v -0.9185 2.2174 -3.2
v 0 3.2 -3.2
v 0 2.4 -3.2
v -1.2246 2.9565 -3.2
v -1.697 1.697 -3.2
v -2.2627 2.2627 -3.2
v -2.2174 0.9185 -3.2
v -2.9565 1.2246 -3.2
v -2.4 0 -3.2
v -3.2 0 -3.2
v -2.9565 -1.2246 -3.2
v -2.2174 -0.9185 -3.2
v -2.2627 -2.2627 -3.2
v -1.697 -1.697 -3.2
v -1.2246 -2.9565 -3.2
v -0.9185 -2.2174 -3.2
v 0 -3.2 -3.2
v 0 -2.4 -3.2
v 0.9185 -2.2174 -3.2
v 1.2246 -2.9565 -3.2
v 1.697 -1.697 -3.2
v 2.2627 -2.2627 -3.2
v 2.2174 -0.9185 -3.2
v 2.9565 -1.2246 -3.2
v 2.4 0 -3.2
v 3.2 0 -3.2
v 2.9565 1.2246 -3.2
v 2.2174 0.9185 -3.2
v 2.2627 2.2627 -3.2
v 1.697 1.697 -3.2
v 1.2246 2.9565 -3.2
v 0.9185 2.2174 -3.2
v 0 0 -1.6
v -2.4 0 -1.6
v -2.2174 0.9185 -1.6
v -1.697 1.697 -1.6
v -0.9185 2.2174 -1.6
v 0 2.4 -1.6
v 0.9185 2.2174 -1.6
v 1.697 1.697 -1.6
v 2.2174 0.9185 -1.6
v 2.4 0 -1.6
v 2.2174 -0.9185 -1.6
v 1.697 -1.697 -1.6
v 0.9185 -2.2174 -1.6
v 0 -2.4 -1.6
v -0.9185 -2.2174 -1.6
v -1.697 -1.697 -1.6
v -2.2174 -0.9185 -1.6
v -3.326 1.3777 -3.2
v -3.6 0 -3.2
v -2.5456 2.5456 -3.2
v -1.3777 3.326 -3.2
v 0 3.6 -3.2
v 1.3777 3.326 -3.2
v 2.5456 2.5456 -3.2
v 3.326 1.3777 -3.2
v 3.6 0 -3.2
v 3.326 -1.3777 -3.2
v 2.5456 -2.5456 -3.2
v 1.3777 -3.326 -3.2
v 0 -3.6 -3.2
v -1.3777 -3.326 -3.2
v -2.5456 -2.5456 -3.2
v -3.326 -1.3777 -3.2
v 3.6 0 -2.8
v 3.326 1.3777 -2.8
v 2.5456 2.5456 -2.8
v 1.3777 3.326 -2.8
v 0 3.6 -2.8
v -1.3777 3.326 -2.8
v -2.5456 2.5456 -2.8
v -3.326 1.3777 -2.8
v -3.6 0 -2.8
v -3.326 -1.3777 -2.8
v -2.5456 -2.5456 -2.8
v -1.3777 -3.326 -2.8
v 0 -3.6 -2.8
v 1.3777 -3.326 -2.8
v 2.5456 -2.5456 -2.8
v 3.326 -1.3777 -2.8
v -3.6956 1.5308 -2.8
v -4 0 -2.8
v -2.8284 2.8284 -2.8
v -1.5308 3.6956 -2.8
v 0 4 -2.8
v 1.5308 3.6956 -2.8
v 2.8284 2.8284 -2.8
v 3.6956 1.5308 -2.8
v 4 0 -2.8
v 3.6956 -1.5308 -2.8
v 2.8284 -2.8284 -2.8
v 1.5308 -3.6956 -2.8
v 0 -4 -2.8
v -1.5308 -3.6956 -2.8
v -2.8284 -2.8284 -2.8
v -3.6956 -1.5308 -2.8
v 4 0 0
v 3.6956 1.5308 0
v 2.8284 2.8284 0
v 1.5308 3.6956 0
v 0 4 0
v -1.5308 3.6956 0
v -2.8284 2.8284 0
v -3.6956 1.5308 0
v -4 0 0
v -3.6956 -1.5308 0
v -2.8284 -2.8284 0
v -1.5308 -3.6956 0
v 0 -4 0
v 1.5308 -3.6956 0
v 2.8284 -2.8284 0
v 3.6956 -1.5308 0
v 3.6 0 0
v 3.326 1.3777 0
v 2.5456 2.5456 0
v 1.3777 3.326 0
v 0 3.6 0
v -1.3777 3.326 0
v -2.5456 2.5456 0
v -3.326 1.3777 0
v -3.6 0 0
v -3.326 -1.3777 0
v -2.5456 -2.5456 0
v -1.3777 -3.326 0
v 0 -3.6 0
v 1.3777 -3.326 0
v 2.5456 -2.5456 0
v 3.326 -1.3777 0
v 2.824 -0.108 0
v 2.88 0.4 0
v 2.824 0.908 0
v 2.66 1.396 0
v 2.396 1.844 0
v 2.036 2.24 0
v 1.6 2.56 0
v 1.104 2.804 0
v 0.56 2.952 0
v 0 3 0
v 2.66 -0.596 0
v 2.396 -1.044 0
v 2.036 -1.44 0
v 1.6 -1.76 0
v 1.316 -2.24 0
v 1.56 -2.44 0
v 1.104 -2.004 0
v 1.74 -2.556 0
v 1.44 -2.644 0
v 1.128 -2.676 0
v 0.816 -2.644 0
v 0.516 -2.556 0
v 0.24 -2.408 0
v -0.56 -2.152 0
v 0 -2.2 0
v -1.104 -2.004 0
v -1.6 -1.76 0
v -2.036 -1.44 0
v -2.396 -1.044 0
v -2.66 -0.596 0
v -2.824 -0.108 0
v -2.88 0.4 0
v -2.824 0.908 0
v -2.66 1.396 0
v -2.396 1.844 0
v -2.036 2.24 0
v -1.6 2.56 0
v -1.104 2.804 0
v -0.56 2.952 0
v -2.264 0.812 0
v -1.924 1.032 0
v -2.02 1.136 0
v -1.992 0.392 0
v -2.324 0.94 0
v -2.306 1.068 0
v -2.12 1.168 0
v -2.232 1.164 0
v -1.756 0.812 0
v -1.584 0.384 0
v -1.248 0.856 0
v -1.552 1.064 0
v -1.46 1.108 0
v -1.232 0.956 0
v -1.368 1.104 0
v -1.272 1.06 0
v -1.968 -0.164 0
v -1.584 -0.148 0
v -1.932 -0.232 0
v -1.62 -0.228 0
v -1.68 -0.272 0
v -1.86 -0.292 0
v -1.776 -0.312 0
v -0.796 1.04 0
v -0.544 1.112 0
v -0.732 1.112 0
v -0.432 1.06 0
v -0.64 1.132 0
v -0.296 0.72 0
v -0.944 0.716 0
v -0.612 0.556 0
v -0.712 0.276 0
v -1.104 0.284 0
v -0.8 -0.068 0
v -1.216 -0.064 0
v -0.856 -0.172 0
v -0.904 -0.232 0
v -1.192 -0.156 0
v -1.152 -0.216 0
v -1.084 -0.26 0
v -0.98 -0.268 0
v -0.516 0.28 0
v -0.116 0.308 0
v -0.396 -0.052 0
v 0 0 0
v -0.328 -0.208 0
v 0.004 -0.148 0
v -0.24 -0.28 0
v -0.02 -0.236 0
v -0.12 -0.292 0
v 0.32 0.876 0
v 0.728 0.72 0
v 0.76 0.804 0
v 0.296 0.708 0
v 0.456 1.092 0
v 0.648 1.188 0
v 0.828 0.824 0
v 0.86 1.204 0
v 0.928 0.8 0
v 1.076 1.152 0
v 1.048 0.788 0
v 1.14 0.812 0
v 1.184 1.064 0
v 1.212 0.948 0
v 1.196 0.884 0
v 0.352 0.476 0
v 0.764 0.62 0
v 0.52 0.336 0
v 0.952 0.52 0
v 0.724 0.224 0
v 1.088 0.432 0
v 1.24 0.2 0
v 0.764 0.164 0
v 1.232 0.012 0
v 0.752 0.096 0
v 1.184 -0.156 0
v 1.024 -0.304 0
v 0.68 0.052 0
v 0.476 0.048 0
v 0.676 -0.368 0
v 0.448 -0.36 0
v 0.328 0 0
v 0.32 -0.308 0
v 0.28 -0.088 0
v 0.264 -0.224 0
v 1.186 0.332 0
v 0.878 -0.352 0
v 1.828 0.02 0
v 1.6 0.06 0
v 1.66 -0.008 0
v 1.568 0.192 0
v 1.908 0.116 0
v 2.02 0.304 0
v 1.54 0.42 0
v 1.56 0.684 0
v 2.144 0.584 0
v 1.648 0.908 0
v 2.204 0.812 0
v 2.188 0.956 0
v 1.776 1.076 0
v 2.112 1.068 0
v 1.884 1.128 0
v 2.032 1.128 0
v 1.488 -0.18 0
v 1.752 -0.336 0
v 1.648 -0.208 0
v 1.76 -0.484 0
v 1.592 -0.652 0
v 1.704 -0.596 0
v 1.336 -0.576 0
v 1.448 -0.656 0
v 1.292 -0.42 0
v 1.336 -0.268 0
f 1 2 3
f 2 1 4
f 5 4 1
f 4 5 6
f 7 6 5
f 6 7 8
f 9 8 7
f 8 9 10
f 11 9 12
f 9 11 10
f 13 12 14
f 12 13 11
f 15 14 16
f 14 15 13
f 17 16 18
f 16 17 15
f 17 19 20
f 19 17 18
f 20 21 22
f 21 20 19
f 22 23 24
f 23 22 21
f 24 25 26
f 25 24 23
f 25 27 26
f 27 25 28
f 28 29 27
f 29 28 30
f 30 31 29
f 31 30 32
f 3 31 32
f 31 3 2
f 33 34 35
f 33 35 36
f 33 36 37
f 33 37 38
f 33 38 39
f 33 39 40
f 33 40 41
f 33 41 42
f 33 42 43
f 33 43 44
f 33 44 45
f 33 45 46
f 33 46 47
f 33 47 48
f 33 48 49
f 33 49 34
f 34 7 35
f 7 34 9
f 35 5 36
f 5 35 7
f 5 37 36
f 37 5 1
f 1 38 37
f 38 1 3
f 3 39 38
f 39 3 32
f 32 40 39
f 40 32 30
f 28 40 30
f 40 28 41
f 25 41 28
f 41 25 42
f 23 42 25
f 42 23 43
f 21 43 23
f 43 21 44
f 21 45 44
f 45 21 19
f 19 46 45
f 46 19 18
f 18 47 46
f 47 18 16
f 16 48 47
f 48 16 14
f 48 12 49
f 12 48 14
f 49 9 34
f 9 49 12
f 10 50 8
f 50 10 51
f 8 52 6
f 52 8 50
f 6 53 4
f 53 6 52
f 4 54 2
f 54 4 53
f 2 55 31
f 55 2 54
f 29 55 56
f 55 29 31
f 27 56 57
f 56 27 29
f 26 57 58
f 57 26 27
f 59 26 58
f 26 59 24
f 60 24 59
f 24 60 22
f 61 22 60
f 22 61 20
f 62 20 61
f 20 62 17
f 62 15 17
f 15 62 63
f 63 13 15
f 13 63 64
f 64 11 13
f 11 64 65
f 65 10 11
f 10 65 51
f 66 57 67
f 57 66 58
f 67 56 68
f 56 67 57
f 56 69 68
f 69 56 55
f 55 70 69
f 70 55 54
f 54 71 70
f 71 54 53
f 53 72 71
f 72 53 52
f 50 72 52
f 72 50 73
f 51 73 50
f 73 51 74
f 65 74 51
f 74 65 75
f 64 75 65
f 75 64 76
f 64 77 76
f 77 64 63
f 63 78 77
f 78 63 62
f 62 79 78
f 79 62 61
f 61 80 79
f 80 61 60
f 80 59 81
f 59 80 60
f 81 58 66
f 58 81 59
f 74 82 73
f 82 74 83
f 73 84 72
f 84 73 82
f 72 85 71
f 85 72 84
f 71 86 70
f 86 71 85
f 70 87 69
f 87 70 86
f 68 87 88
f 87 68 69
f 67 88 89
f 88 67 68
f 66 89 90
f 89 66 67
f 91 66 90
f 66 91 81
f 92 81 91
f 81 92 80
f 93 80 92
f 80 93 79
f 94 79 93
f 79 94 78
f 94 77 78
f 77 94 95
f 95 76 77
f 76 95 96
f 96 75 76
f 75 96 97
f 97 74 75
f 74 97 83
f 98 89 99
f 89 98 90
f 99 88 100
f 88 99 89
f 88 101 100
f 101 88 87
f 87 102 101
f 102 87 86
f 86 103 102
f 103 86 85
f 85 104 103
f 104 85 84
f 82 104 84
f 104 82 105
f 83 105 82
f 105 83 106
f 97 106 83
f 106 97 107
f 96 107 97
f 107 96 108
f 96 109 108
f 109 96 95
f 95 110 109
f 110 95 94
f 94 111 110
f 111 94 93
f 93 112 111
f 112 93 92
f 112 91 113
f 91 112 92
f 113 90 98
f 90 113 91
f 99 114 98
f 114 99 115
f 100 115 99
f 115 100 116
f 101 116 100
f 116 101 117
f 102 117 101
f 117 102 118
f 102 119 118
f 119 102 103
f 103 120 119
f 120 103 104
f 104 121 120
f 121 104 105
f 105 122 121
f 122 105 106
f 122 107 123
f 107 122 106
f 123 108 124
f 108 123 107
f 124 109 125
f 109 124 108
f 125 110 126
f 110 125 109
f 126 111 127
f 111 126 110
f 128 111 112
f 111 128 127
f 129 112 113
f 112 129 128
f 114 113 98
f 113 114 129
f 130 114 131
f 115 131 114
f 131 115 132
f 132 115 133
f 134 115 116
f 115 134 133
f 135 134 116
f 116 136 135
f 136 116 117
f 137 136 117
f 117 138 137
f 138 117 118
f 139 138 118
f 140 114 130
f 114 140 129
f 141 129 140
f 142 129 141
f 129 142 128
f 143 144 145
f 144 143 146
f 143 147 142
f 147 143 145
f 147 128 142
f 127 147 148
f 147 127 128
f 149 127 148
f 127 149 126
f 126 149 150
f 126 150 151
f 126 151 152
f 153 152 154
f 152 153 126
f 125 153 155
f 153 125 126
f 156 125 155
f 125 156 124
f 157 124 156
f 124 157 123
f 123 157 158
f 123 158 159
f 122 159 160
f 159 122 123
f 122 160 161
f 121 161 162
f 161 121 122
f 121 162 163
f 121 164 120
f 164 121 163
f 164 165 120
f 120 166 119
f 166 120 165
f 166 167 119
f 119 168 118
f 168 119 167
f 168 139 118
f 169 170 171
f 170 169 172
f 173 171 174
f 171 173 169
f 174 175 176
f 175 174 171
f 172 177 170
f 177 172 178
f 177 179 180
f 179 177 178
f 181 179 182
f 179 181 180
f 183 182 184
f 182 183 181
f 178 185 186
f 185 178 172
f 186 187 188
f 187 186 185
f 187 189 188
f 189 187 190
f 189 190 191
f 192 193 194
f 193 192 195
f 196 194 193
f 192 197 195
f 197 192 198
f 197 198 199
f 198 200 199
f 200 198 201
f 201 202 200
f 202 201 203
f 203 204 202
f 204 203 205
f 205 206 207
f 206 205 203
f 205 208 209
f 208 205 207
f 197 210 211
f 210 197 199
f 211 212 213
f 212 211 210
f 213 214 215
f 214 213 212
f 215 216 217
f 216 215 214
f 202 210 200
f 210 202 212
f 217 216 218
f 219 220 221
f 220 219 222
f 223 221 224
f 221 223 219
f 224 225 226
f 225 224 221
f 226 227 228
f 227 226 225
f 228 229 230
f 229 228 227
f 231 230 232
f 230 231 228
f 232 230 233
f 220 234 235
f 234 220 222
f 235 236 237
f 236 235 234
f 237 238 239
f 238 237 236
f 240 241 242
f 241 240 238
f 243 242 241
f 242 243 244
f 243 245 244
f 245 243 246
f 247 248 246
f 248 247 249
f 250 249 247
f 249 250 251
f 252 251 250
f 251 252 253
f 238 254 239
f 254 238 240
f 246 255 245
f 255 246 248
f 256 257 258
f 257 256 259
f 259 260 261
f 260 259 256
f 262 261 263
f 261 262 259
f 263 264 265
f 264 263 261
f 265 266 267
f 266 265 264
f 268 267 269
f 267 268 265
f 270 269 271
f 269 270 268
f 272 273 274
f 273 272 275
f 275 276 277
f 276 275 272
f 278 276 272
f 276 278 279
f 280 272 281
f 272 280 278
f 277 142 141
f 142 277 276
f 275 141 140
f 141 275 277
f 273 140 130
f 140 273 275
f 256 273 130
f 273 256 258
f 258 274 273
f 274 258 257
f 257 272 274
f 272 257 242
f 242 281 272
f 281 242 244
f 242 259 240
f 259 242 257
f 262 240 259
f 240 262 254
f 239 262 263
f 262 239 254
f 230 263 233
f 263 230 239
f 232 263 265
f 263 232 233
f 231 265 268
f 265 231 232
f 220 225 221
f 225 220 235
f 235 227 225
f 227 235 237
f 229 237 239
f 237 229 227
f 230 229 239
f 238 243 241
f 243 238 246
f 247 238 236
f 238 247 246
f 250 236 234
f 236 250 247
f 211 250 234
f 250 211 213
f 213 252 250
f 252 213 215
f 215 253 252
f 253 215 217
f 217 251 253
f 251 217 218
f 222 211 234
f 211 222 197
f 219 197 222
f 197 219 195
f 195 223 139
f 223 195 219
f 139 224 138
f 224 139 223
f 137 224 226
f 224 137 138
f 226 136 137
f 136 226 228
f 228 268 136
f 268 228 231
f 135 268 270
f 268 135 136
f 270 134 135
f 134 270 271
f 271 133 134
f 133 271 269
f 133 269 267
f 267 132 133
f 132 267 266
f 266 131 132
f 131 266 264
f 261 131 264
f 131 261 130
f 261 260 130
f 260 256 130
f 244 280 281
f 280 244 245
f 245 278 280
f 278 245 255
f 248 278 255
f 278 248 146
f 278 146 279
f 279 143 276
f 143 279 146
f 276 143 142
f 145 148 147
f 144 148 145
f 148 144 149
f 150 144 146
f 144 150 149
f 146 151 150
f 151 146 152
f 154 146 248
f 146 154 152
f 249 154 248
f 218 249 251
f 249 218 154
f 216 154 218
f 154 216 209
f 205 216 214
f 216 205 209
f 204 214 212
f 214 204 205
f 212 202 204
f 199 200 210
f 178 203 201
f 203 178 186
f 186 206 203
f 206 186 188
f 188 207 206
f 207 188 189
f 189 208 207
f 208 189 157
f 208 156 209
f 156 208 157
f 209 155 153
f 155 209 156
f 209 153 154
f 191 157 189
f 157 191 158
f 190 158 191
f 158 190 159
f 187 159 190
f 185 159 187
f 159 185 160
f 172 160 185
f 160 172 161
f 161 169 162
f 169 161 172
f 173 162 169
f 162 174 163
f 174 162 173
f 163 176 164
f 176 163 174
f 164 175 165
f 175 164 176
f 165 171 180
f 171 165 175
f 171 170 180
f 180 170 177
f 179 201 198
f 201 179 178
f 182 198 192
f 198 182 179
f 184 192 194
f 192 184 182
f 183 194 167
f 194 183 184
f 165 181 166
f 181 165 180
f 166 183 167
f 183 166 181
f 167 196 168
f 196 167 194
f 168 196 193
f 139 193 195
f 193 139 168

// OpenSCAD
use <../lib.scad>
use <s/98138p1is01.scad>
use <s/98138s01.scad>
$fa=1; $fs=0.2;
function ldraw_lib__98138p1j(realsolid=false) = [
// 0 Tile  1 x  1 Round with Bright Light Orange "YAS!" in Speech Bubble on Dark Turquoise Background Pattern
// 0 Name: 98138p1j.dat
// 0 Author: Gerald Lasser [GeraldLasser]
// 0 !LDRAW_ORG Part UPDATE 2022-04
// 0 !LICENSE Licensed under CC BY 2.0 and CC BY 4.0 : see CAreadme.txt
// 
// 0 BFC CERTIFY CCW
  [0,"BFC","CERTIFY"],
  [0,"BFC","CCW"],
// 
// 0 !KEYWORDS Dots, Set Creativity Box 8
// 
// 0 !HISTORY 2022-07-18 [PTadmin] Official Update 2022-04
// 
// 
// 1 16 0 0 0 1 0 0 0 1 0 0 0 1 s\98138s01.dat
  [1,16,0,0,0,1,0,0,0,1,0,0,0,1, ldraw_lib__s__98138s01(realsolid)],
// 1 3 0 0 0 -1 0 0 0 1 0 0 0 1 s\98138p1is01.dat
  [1,3,0,0,0,-1,0,0,0,1,0,0,0,1, ldraw_lib__s__98138p1is01(realsolid)],
// 
// 4 191 -5.66 0 2.03 -4.98 0 .98 -4.81 0 2.58 -5.05 0 2.84
  [4,191,-5.66,0,2.03,-4.98,0,.98,-4.81,0,2.58,-5.05,0,2.84],
// 4 191 -5.81 0 2.35 -5.66 0 2.03 -5.05 0 2.84 -5.765 0 2.67
  [4,191,-5.81,0,2.35,-5.66,0,2.03,-5.05,0,2.84,-5.765,0,2.67],
// 4 191 -5.05 0 2.84 -5.3 0 2.92 -5.58 0 2.91 -5.765 0 2.67
  [4,191,-5.05,0,2.84,-5.3,0,2.92,-5.58,0,2.91,-5.765,0,2.67],
// 4 191 -4.39 0 2.03 -4.81 0 2.58 -4.98 0 .98 -3.96 0 .96
  [4,191,-4.39,0,2.03,-4.81,0,2.58,-4.98,0,.98,-3.96,0,.96],
// 4 191 -3.88 0 2.66 -4.39 0 2.03 -3.96 0 .96 -3.12 0 2.14
  [4,191,-3.88,0,2.66,-4.39,0,2.03,-3.96,0,.96,-3.12,0,2.14],
// 4 191 -3.88 0 2.66 -3.12 0 2.14 -3.08 0 2.39 -3.65 0 2.77
  [4,191,-3.88,0,2.66,-3.12,0,2.14,-3.08,0,2.39,-3.65,0,2.77],
// 4 191 -3.42 0 2.76 -3.65 0 2.77 -3.08 0 2.39 -3.18 0 2.65
  [4,191,-3.42,0,2.76,-3.65,0,2.77,-3.08,0,2.39,-3.18,0,2.65],
// 4 191 -3.96 0 -.37 -3.96 0 .96 -4.98 0 .98 -4.92 0 -.41
  [4,191,-3.96,0,-.37,-3.96,0,.96,-4.98,0,.98,-4.92,0,-.41],
// 4 191 -3.96 0 -.37 -4.92 0 -.41 -4.83 0 -.58 -4.05 0 -.57
  [4,191,-3.96,0,-.37,-4.92,0,-.41,-4.83,0,-.58,-4.05,0,-.57],
// 4 191 -4.2 0 -.68 -4.05 0 -.57 -4.83 0 -.58 -4.65 0 -.73
  [4,191,-4.2,0,-.68,-4.05,0,-.57,-4.83,0,-.58,-4.65,0,-.73],
// 3 191 -4.2 0 -.68 -4.65 0 -.73 -4.44 0 -.78
  [3,191,-4.2,0,-.68,-4.65,0,-.73,-4.44,0,-.78],
// 4 191 -1.83 0 2.78 -1.99 0 2.6 -1.08 0 2.65 -1.36 0 2.78
  [4,191,-1.83,0,2.78,-1.99,0,2.6,-1.08,0,2.65,-1.36,0,2.78],
// 3 191 -1.6 0 2.83 -1.83 0 2.78 -1.36 0 2.78
  [3,191,-1.6,0,2.83,-1.83,0,2.78,-1.36,0,2.78],
// 4 191 -1.08 0 2.65 -1.99 0 2.6 -2.36 0 1.79 -.74 0 1.8
  [4,191,-1.08,0,2.65,-1.99,0,2.6,-2.36,0,1.79,-.74,0,1.8],
// 3 191 -.74 0 1.8 -2.36 0 1.79 -1.53 0 1.39
  [3,191,-.74,0,1.8,-2.36,0,1.79,-1.53,0,1.39],
// 4 191 -1.78 0 .69 -1.53 0 1.39 -2.36 0 1.79 -2.76 0 .71
  [4,191,-1.78,0,.69,-1.53,0,1.39,-2.36,0,1.79,-2.76,0,.71],
// 4 191 -1.78 0 .69 -2.76 0 .71 -3.04 0 -.16 -2 0 -.17
  [4,191,-1.78,0,.69,-2.76,0,.71,-3.04,0,-.16,-2,0,-.17],
// 4 191 -2.14 0 -.43 -2 0 -.17 -3.04 0 -.16 -2.26 0 -.58
  [4,191,-2.14,0,-.43,-2,0,-.17,-3.04,0,-.16,-2.26,0,-.58],
// 4 191 -2.26 0 -.58 -3.04 0 -.16 -2.98 0 -.39 -2.88 0 -.54
  [4,191,-2.26,0,-.58,-3.04,0,-.16,-2.98,0,-.39,-2.88,0,-.54],
// 4 191 -2.45 0 -.67 -2.26 0 -.58 -2.88 0 -.54 -2.71 0 -.65
  [4,191,-2.45,0,-.67,-2.26,0,-.58,-2.88,0,-.54,-2.71,0,-.65],
// 4 191 -.74 0 1.8 -1.53 0 1.39 -1.29 0 .7 -.29 0 .77
  [4,191,-.74,0,1.8,-1.53,0,1.39,-1.29,0,.7,-.29,0,.77],
// 4 191 -.29 0 .77 -1.29 0 .7 -.99 0 -.13 0 0 0
  [4,191,-.29,0,.77,-1.29,0,.7,-.99,0,-.13,0,0,0],
// 4 191 .01 0 -.37 0 0 0 -.99 0 -.13 -.82 0 -.52
  [4,191,.01,0,-.37,0,0,0,-.99,0,-.13,-.82,0,-.52],
// 4 191 .01 0 -.37 -.82 0 -.52 -.6 0 -.7 -.05 0 -.59
  [4,191,.01,0,-.37,-.82,0,-.52,-.6,0,-.7,-.05,0,-.59],
// 4 191 -1.78 0 .69 -2 0 -.17 -.99 0 -.13 -1.29 0 .7
  [4,191,-1.78,0,.69,-2,0,-.17,-.99,0,-.13,-1.29,0,.7],
// 3 191 -.05 0 -.59 -.6 0 -.7 -.3 0 -.73
  [3,191,-.05,0,-.59,-.6,0,-.7,-.3,0,-.73],
// 4 191 .8 0 2.19 .74 0 1.77 1.82 0 1.8 1.9 0 2.01
  [4,191,.8,0,2.19,.74,0,1.77,1.82,0,1.8,1.9,0,2.01],
// 4 191 1.14 0 2.73 .8 0 2.19 1.9 0 2.01 1.62 0 2.97
  [4,191,1.14,0,2.73,.8,0,2.19,1.9,0,2.01,1.62,0,2.97],
// 4 191 1.62 0 2.97 1.9 0 2.01 2.07 0 2.06 2.15 0 3.01
  [4,191,1.62,0,2.97,1.9,0,2.01,2.07,0,2.06,2.15,0,3.01],
// 4 191 2.69 0 2.88 2.15 0 3.01 2.07 0 2.06 2.32 0 2
  [4,191,2.69,0,2.88,2.15,0,3.01,2.07,0,2.06,2.32,0,2],
// 4 191 2.69 0 2.88 2.32 0 2 2.62 0 1.97 2.85 0 2.03
  [4,191,2.69,0,2.88,2.32,0,2,2.62,0,1.97,2.85,0,2.03],
// 4 191 2.96 0 2.66 2.69 0 2.88 2.85 0 2.03 3.03 0 2.37
  [4,191,2.96,0,2.66,2.69,0,2.88,2.85,0,2.03,3.03,0,2.37],
// 3 191 3.03 0 2.37 2.85 0 2.03 2.99 0 2.21
  [3,191,3.03,0,2.37,2.85,0,2.03,2.99,0,2.21],
// 4 191 1.91 0 1.55 1.82 0 1.8 .74 0 1.77 .88 0 1.19
  [4,191,1.91,0,1.55,1.82,0,1.8,.74,0,1.77,.88,0,1.19],
// 4 191 1.91 0 1.55 .88 0 1.19 1.3 0 .84 2.38 0 1.3
  [4,191,1.91,0,1.55,.88,0,1.19,1.3,0,.84,2.38,0,1.3],
// 4 191 2.38 0 1.3 1.3 0 .84 1.81 0 .56 2.72 0 1.08
  [4,191,2.38,0,1.3,1.3,0,.84,1.81,0,.56,2.72,0,1.08],
// 4 191 3.1 0 .5 1.81 0 .56 1.91 0 .41 3.08 0 .03
  [4,191,3.1,0,.5,1.81,0,.56,1.91,0,.41,3.08,0,.03],
// 4 191 3.08 0 .03 1.91 0 .41 1.88 0 .24 2.96 0 -.39
  [4,191,3.08,0,.03,1.91,0,.41,1.88,0,.24,2.96,0,-.39],
// 4 191 2.96 0 -.39 1.88 0 .24 1.7 0 .13 2.56 0 -.76
  [4,191,2.96,0,-.39,1.88,0,.24,1.7,0,.13,2.56,0,-.76],
// 4 191 1.69 0 -.92 1.7 0 .13 1.19 0 .12 1.12 0 -.9
  [4,191,1.69,0,-.92,1.7,0,.13,1.19,0,.12,1.12,0,-.9],
// 4 191 .8 0 -.77 1.12 0 -.9 1.19 0 .12 .82 0 0
  [4,191,.8,0,-.77,1.12,0,-.9,1.19,0,.12,.82,0,0],
// 4 191 .8 0 -.77 .82 0 0 .7 0 -.22 .66 0 -.56
  [4,191,.8,0,-.77,.82,0,0,.7,0,-.22,.66,0,-.56],
// 4 191 2.965 0 .83 2.72 0 1.08 1.81 0 .56 3.1 0 .5
  [4,191,2.965,0,.83,2.72,0,1.08,1.81,0,.56,3.1,0,.5],
// 4 191 2.195 0 -.88 2.56 0 -.76 1.7 0 .13 1.69 0 -.92
  [4,191,2.195,0,-.88,2.56,0,-.76,1.7,0,.13,1.69,0,-.92],
// 4 191 4 0 .15 4.15 0 -.02 4.57 0 .05 3.92 0 .48
  [4,191,4,0,.15,4.15,0,-.02,4.57,0,.05,3.92,0,.48],
// 4 191 3.92 0 .48 4.57 0 .05 4.77 0 .29 5.05 0 .76
  [4,191,3.92,0,.48,4.57,0,.05,4.77,0,.29,5.05,0,.76],
// 4 191 3.85 0 1.05 3.92 0 .48 5.05 0 .76 3.9 0 1.71
  [4,191,3.85,0,1.05,3.92,0,.48,5.05,0,.76,3.9,0,1.71],
// 4 191 4.12 0 2.27 3.9 0 1.71 5.05 0 .76 5.36 0 1.46
  [4,191,4.12,0,2.27,3.9,0,1.71,5.05,0,.76,5.36,0,1.46],
// 4 191 4.12 0 2.27 5.36 0 1.46 5.51 0 2.03 5.47 0 2.39
  [4,191,4.12,0,2.27,5.36,0,1.46,5.51,0,2.03,5.47,0,2.39],
// 4 191 4.12 0 2.27 5.47 0 2.39 5.28 0 2.67 4.44 0 2.69
  [4,191,4.12,0,2.27,5.47,0,2.39,5.28,0,2.67,4.44,0,2.69],
// 4 191 4.71 0 2.82 4.44 0 2.69 5.28 0 2.67 5.08 0 2.82
  [4,191,4.71,0,2.82,4.44,0,2.69,5.28,0,2.67,5.08,0,2.82],
// 4 191 4.38 0 -.84 4.12 0 -.52 3.72 0 -.45 4.4 0 -1.21
  [4,191,4.38,0,-.84,4.12,0,-.52,3.72,0,-.45,4.4,0,-1.21],
// 4 191 4.26 0 -1.49 4.4 0 -1.21 3.72 0 -.45 3.98 0 -1.63
  [4,191,4.26,0,-1.49,4.4,0,-1.21,3.72,0,-.45,3.98,0,-1.63],
// 4 191 3.62 0 -1.64 3.98 0 -1.63 3.72 0 -.45 3.34 0 -1.44
  [4,191,3.62,0,-1.64,3.98,0,-1.63,3.72,0,-.45,3.34,0,-1.44],
// 4 191 3.23 0 -1.05 3.34 0 -1.44 3.72 0 -.45 3.34 0 -.67
  [4,191,3.23,0,-1.05,3.34,0,-1.44,3.72,0,-.45,3.34,0,-.67],
// 4 16 4.26 0 -1.49 3.98 0 -1.63 5.09 0 -3.6 5.99 0 -2.61
  [4,16,4.26,0,-1.49,3.98,0,-1.63,5.09,0,-3.6,5.99,0,-2.61],
// 4 16 4.26 0 -1.49 5.99 0 -2.61 6.65 0 -1.49 4.4 0 -1.21
  [4,16,4.26,0,-1.49,5.99,0,-2.61,6.65,0,-1.49,4.4,0,-1.21],
// 4 16 4.38 0 -0.84 4.4 0 -1.21 6.65 0 -1.49 7.06 0 -0.27
  [4,16,4.38,0,-0.84,4.4,0,-1.21,6.65,0,-1.49,7.06,0,-0.27],
// 4 16 4.38 0 -0.84 7.06 0 -0.27 4.57 0 0.05 4.15 0 -0.02
  [4,16,4.38,0,-0.84,7.06,0,-0.27,4.57,0,0.05,4.15,0,-0.02],
// 4 16 4.12 0 -0.52 4.38 0 -0.84 4.15 0 -0.02 4 0 0.15
  [4,16,4.12,0,-0.52,4.38,0,-0.84,4.15,0,-0.02,4,0,0.15],
// 4 16 3.72 0 -0.45 4.12 0 -0.52 4 0 0.15 3.08 0 0.03
  [4,16,3.72,0,-0.45,4.12,0,-0.52,4,0,0.15,3.08,0,0.03],
// 4 16 2.96 0 -0.39 3.34 0 -0.67 3.72 0 -0.45 3.08 0 0.03
  [4,16,2.96,0,-0.39,3.34,0,-0.67,3.72,0,-0.45,3.08,0,0.03],
// 4 16 3.1 0 0.5 3.08 0 0.03 4 0 0.15 3.92 0 0.48
  [4,16,3.1,0,0.5,3.08,0,0.03,4,0,0.15,3.92,0,0.48],
// 4 16 3.1 0 0.5 3.92 0 0.48 3.85 0 1.05 2.965 0 0.83
  [4,16,3.1,0,0.5,3.92,0,0.48,3.85,0,1.05,2.965,0,0.83],
// 4 16 2.72 0 1.08 2.965 0 0.83 3.85 0 1.05 3.9 0 1.71
  [4,16,2.72,0,1.08,2.965,0,0.83,3.85,0,1.05,3.9,0,1.71],
// 4 16 2.85 0 2.03 2.72 0 1.08 3.9 0 1.71 2.99 0 2.21
  [4,16,2.85,0,2.03,2.72,0,1.08,3.9,0,1.71,2.99,0,2.21],
// 4 16 2.99 0 2.21 3.9 0 1.71 4.12 0 2.27 3.03 0 2.37
  [4,16,2.99,0,2.21,3.9,0,1.71,4.12,0,2.27,3.03,0,2.37],
// 4 16 3.03 0 2.37 4.12 0 2.27 4.44 0 2.69 2.96 0 2.66
  [4,16,3.03,0,2.37,4.12,0,2.27,4.44,0,2.69,2.96,0,2.66],
// 4 16 1.9 0 2.01 1.82 0 1.8 1.91 0 1.55 2.07 0 2.06
  [4,16,1.9,0,2.01,1.82,0,1.8,1.91,0,1.55,2.07,0,2.06],
// 4 16 2.07 0 2.06 1.91 0 1.55 2.38 0 1.3 2.32 0 2
  [4,16,2.07,0,2.06,1.91,0,1.55,2.38,0,1.3,2.32,0,2],
// 4 16 2.62 0 1.97 2.32 0 2 2.38 0 1.3 2.72 0 1.08
  [4,16,2.62,0,1.97,2.32,0,2,2.38,0,1.3,2.72,0,1.08],
// 3 16 2.85 0 2.03 2.62 0 1.97 2.72 0 1.08
  [3,16,2.85,0,2.03,2.62,0,1.97,2.72,0,1.08],
// 4 16 1.81 0 0.56 1.7 0 0.13 1.88 0 0.24 1.91 0 0.41
  [4,16,1.81,0,0.56,1.7,0,0.13,1.88,0,0.24,1.91,0,0.41],
// 4 16 1.3 0 0.84 1.19 0 0.12 1.7 0 0.13 1.81 0 0.56
  [4,16,1.3,0,0.84,1.19,0,0.12,1.7,0,0.13,1.81,0,0.56],
// 4 16 0.88 0 1.19 0.82 0 0 1.19 0 0.12 1.3 0 0.84
  [4,16,0.88,0,1.19,0.82,0,0,1.19,0,0.12,1.3,0,0.84],
// 4 16 -0.29 0 0.77 0 0 0 0.82 0 0 0.88 0 1.19
  [4,16,-0.29,0,0.77,0,0,0,0.82,0,0,0.88,0,1.19],
// 4 16 0 0 0 0.01 0 -0.37 0.7 0 -0.22 0.82 0 0
  [4,16,0,0,0,0.01,0,-0.37,0.7,0,-0.22,0.82,0,0],
// 4 16 0.01 0 -0.37 -0.05 0 -0.59 0.66 0 -0.56 0.7 0 -0.22
  [4,16,0.01,0,-0.37,-0.05,0,-0.59,0.66,0,-0.56,0.7,0,-0.22],
// 4 16 -0.05 0 -0.59 -0.3 0 -0.73 0.8 0 -0.77 0.66 0 -0.56
  [4,16,-0.05,0,-0.59,-0.3,0,-0.73,0.8,0,-0.77,0.66,0,-0.56],
// 4 16 -0.74 0 1.8 -0.29 0 0.77 0.88 0 1.19 0.74 0 1.77
  [4,16,-0.74,0,1.8,-0.29,0,0.77,0.88,0,1.19,0.74,0,1.77],
// 4 16 -0.74 0 1.8 0.74 0 1.77 0.8 0 2.19 -1.08 0 2.65
  [4,16,-0.74,0,1.8,0.74,0,1.77,0.8,0,2.19,-1.08,0,2.65],
// 4 16 -1.08 0 2.65 0.8 0 2.19 1.14 0 2.73 0 0 7.5
  [4,16,-1.08,0,2.65,0.8,0,2.19,1.14,0,2.73,0,0,7.5],
// 4 16 1.4 0 7.38 0 0 7.5 1.14 0 2.73 1.62 0 2.97
  [4,16,1.4,0,7.38,0,0,7.5,1.14,0,2.73,1.62,0,2.97],
// 4 16 1.4 0 7.38 1.62 0 2.97 2.15 0 3.01 2.76 0 7.01
  [4,16,1.4,0,7.38,1.62,0,2.97,2.15,0,3.01,2.76,0,7.01],
// 4 16 4 0 6.4 2.76 0 7.01 2.15 0 3.01 2.69 0 2.88
  [4,16,4,0,6.4,2.76,0,7.01,2.15,0,3.01,2.69,0,2.88],
// 4 16 4 0 6.4 2.69 0 2.88 2.96 0 2.66 4.44 0 2.69
  [4,16,4,0,6.4,2.69,0,2.88,2.96,0,2.66,4.44,0,2.69],
// 4 16 4 0 6.4 4.44 0 2.69 4.71 0 2.82 5.09 0 5.6
  [4,16,4,0,6.4,4.44,0,2.69,4.71,0,2.82,5.09,0,5.6],
// 4 16 5.09 0 5.6 4.71 0 2.82 5.08 0 2.82 5.99 0 4.61
  [4,16,5.09,0,5.6,4.71,0,2.82,5.08,0,2.82,5.99,0,4.61],
// 4 16 6.65 0 3.49 5.99 0 4.61 5.08 0 2.82 5.28 0 2.67
  [4,16,6.65,0,3.49,5.99,0,4.61,5.08,0,2.82,5.28,0,2.67],
// 3 16 6.65 0 3.49 5.28 0 2.67 5.47 0 2.39
  [3,16,6.65,0,3.49,5.28,0,2.67,5.47,0,2.39],
// 4 16 6.65 0 3.49 5.47 0 2.39 5.51 0 2.03 7.06 0 2.27
  [4,16,6.65,0,3.49,5.47,0,2.39,5.51,0,2.03,7.06,0,2.27],
// 4 16 7.2 0 1 7.06 0 2.27 5.51 0 2.03 5.36 0 1.46
  [4,16,7.2,0,1,7.06,0,2.27,5.51,0,2.03,5.36,0,1.46],
// 4 16 7.2 0 1 5.36 0 1.46 5.05 0 0.76 7.06 0 -0.27
  [4,16,7.2,0,1,5.36,0,1.46,5.05,0,0.76,7.06,0,-0.27],
// 3 16 5.05 0 0.76 4.77 0 0.29 7.06 0 -0.27
  [3,16,5.05,0,0.76,4.77,0,0.29,7.06,0,-0.27],
// 3 16 4.77 0 0.29 4.57 0 0.05 7.06 0 -0.27
  [3,16,4.77,0,0.29,4.57,0,0.05,7.06,0,-0.27],
// 4 16 2.96 0 -0.39 2.56 0 -0.76 3.23 0 -1.05 3.34 0 -0.67
  [4,16,2.96,0,-0.39,2.56,0,-0.76,3.23,0,-1.05,3.34,0,-0.67],
// 4 16 3.23 0 -1.05 2.56 0 -0.76 2.195 0 -0.88 3.34 0 -1.44
  [4,16,3.23,0,-1.05,2.56,0,-0.76,2.195,0,-0.88,3.34,0,-1.44],
// 4 16 3.34 0 -1.44 2.195 0 -0.88 1.69 0 -0.92 2.76 0 -5.01
  [4,16,3.34,0,-1.44,2.195,0,-0.88,1.69,0,-0.92,2.76,0,-5.01],
// 3 16 3.34 0 -1.44 2.76 0 -5.01 3.62 0 -1.64
  [3,16,3.34,0,-1.44,2.76,0,-5.01,3.62,0,-1.64],
// 4 16 3.98 0 -1.63 3.62 0 -1.64 2.76 0 -5.01 4 0 -4.4
  [4,16,3.98,0,-1.63,3.62,0,-1.64,2.76,0,-5.01,4,0,-4.4],
// 3 16 3.98 0 -1.63 4 0 -4.4 5.09 0 -3.6
  [3,16,3.98,0,-1.63,4,0,-4.4,5.09,0,-3.6],
// 3 16 3.9 0 -6.1 3.6 0 -6.61 4.35 0 -6.39
  [3,16,3.9,0,-6.1,3.6,0,-6.61,4.35,0,-6.39],
// 4 16 3.29 0 -5.6 2.82 0 -6.69 3.6 0 -6.61 3.9 0 -6.1
  [4,16,3.29,0,-5.6,2.82,0,-6.69,3.6,0,-6.61,3.9,0,-6.1],
// 4 16 2.76 0 -5.01 2.04 0 -6.61 2.82 0 -6.69 3.29 0 -5.6
  [4,16,2.76,0,-5.01,2.04,0,-6.61,2.82,0,-6.69,3.29,0,-5.6],
// 4 16 1.29 0 -6.39 2.04 0 -6.61 2.76 0 -5.01 0.6 0 -6.02
  [4,16,1.29,0,-6.39,2.04,0,-6.61,2.76,0,-5.01,0.6,0,-6.02],
// 4 16 0 0 -5.5 0.6 0 -6.02 2.76 0 -5.01 1.69 0 -0.92
  [4,16,0,0,-5.5,0.6,0,-6.02,2.76,0,-5.01,1.69,0,-0.92],
// 3 16 1.12 0 -0.9 0 0 -5.5 1.69 0 -0.92
  [3,16,1.12,0,-0.9,0,0,-5.5,1.69,0,-0.92],
// 4 16 0 0 -5.5 1.12 0 -0.9 0.8 0 -0.77 -0.3 0 -0.73
  [4,16,0,0,-5.5,1.12,0,-0.9,0.8,0,-0.77,-0.3,0,-0.73],
// 4 16 0 0 -5.5 -0.3 0 -0.73 -0.6 0 -0.7 -2.45 0 -0.67
  [4,16,0,0,-5.5,-0.3,0,-0.73,-0.6,0,-0.7,-2.45,0,-0.67],
// 4 16 -2.45 0 -0.67 -0.6 0 -0.7 -0.82 0 -0.52 -2.26 0 -0.58
  [4,16,-2.45,0,-0.67,-0.6,0,-0.7,-0.82,0,-0.52,-2.26,0,-0.58],
// 4 16 -2.14 0 -0.43 -2.26 0 -0.58 -0.82 0 -0.52 -0.99 0 -0.13
  [4,16,-2.14,0,-0.43,-2.26,0,-0.58,-0.82,0,-0.52,-0.99,0,-0.13],
// 3 16 -0.99 0 -0.13 -2 0 -0.17 -2.14 0 -0.43
  [3,16,-0.99,0,-0.13,-2,0,-0.17,-2.14,0,-0.43],
// 3 16 -1.53 0 1.39 -1.78 0 0.69 -1.29 0 0.7
  [3,16,-1.53,0,1.39,-1.78,0,0.69,-1.29,0,0.7],
// 4 16 -3.04 0 -0.16 -2.76 0 0.71 -3.96 0 0.96 -3.96 0 -0.37
  [4,16,-3.04,0,-0.16,-2.76,0,0.71,-3.96,0,0.96,-3.96,0,-0.37],
// 4 16 -2.98 0 -0.39 -3.04 0 -0.16 -3.96 0 -0.37 -4.05 0 -0.57
  [4,16,-2.98,0,-0.39,-3.04,0,-0.16,-3.96,0,-0.37,-4.05,0,-0.57],
// 4 16 -2.88 0 -0.54 -2.98 0 -0.39 -4.05 0 -0.57 -4.2 0 -0.68
  [4,16,-2.88,0,-0.54,-2.98,0,-0.39,-4.05,0,-0.57,-4.2,0,-0.68],
// 4 16 -2.71 0 -0.65 -2.88 0 -0.54 -4.2 0 -0.68 -5.09 0 -3.6
  [4,16,-2.71,0,-0.65,-2.88,0,-0.54,-4.2,0,-0.68,-5.09,0,-3.6],
// 4 16 -2.45 0 -0.67 -2.71 0 -0.65 -5.09 0 -3.6 -4 0 -4.4
  [4,16,-2.45,0,-0.67,-2.71,0,-0.65,-5.09,0,-3.6,-4,0,-4.4],
// 4 16 -2.45 0 -0.67 -4 0 -4.4 -2.76 0 -5.01 -1.4 0 -5.38
  [4,16,-2.45,0,-0.67,-4,0,-4.4,-2.76,0,-5.01,-1.4,0,-5.38],
// 3 16 -2.45 0 -0.67 -1.4 0 -5.38 0 0 -5.5
  [3,16,-2.45,0,-0.67,-1.4,0,-5.38,0,0,-5.5],
// 4 16 -4.44 0 -0.78 -5.99 0 -2.61 -5.09 0 -3.6 -4.2 0 -0.68
  [4,16,-4.44,0,-0.78,-5.99,0,-2.61,-5.09,0,-3.6,-4.2,0,-0.68],
// 4 16 -5.99 0 -2.61 -4.44 0 -0.78 -4.65 0 -0.73 -6.65 0 -1.49
  [4,16,-5.99,0,-2.61,-4.44,0,-0.78,-4.65,0,-0.73,-6.65,0,-1.49],
// 3 16 -4.83 0 -0.58 -6.65 0 -1.49 -4.65 0 -0.73
  [3,16,-4.83,0,-0.58,-6.65,0,-1.49,-4.65,0,-0.73],
// 4 16 -6.65 0 -1.49 -4.83 0 -0.58 -4.92 0 -0.41 -7.06 0 -0.27
  [4,16,-6.65,0,-1.49,-4.83,0,-0.58,-4.92,0,-0.41,-7.06,0,-0.27],
// 4 16 -7.2 0 1 -7.06 0 -0.27 -4.92 0 -0.41 -4.98 0 0.98
  [4,16,-7.2,0,1,-7.06,0,-0.27,-4.92,0,-0.41,-4.98,0,0.98],
// 4 16 -7.2 0 1 -4.98 0 0.98 -5.66 0 2.03 -7.06 0 2.27
  [4,16,-7.2,0,1,-4.98,0,0.98,-5.66,0,2.03,-7.06,0,2.27],
// 3 16 -5.81 0 2.35 -7.06 0 2.27 -5.66 0 2.03
  [3,16,-5.81,0,2.35,-7.06,0,2.27,-5.66,0,2.03],
// 4 16 -7.06 0 2.27 -5.81 0 2.35 -5.765 0 2.67 -6.65 0 3.49
  [4,16,-7.06,0,2.27,-5.81,0,2.35,-5.765,0,2.67,-6.65,0,3.49],
// 4 16 -6.65 0 3.49 -5.765 0 2.67 -5.58 0 2.91 -5.99 0 4.61
  [4,16,-6.65,0,3.49,-5.765,0,2.67,-5.58,0,2.91,-5.99,0,4.61],
// 4 16 -5.99 0 4.61 -5.58 0 2.91 -5.3 0 2.92 -5.09 0 5.6
  [4,16,-5.99,0,4.61,-5.58,0,2.91,-5.3,0,2.92,-5.09,0,5.6],
// 4 16 -5.09 0 5.6 -5.3 0 2.92 -5.05 0 2.84 -3.88 0 2.66
  [4,16,-5.09,0,5.6,-5.3,0,2.92,-5.05,0,2.84,-3.88,0,2.66],
// 3 16 -5.05 0 2.84 -4.81 0 2.58 -3.88 0 2.66
  [3,16,-5.05,0,2.84,-4.81,0,2.58,-3.88,0,2.66],
// 3 16 -3.88 0 2.66 -4.81 0 2.58 -4.39 0 2.03
  [3,16,-3.88,0,2.66,-4.81,0,2.58,-4.39,0,2.03],
// 4 16 -3.96 0 0.96 -2.76 0 0.71 -2.36 0 1.79 -3.12 0 2.14
  [4,16,-3.96,0,0.96,-2.76,0,0.71,-2.36,0,1.79,-3.12,0,2.14],
// 4 16 -3.08 0 2.39 -3.12 0 2.14 -2.36 0 1.79 -1.99 0 2.6
  [4,16,-3.08,0,2.39,-3.12,0,2.14,-2.36,0,1.79,-1.99,0,2.6],
// 4 16 -3.18 0 2.65 -3.08 0 2.39 -1.99 0 2.6 -1.83 0 2.78
  [4,16,-3.18,0,2.65,-3.08,0,2.39,-1.99,0,2.6,-1.83,0,2.78],
// 4 16 -3.42 0 2.76 -3.18 0 2.65 -1.83 0 2.78 -2.76 0 7.01
  [4,16,-3.42,0,2.76,-3.18,0,2.65,-1.83,0,2.78,-2.76,0,7.01],
// 4 16 -5.09 0 5.6 -3.88 0 2.66 -3.65 0 2.77 -4 0 6.4
  [4,16,-5.09,0,5.6,-3.88,0,2.66,-3.65,0,2.77,-4,0,6.4],
// 4 16 -4 0 6.4 -3.65 0 2.77 -3.42 0 2.76 -2.76 0 7.01
  [4,16,-4,0,6.4,-3.65,0,2.77,-3.42,0,2.76,-2.76,0,7.01],
// 4 16 -2.76 0 7.01 -1.83 0 2.78 -1.6 0 2.83 -1.4 0 7.38
  [4,16,-2.76,0,7.01,-1.83,0,2.78,-1.6,0,2.83,-1.4,0,7.38],
// 3 16 -1.4 0 7.38 -1.6 0 2.83 -1.36 0 2.78
  [3,16,-1.4,0,7.38,-1.6,0,2.83,-1.36,0,2.78],
// 4 16 -1.4 0 7.38 -1.36 0 2.78 -1.08 0 2.65 0 0 7.5
  [4,16,-1.4,0,7.38,-1.36,0,2.78,-1.08,0,2.65,0,0,7.5],
];
module ldraw_lib__98138p1j(step=0, col=false, unit=2/5, alt=false, line=0.2, solid=!$preview)
    makepoly(ldraw_lib__98138p1j(solid), step=step, col=col, unit=unit, alt=alt, line=line, solid=solid);
ldraw_lib__98138p1j(line=0.2);
